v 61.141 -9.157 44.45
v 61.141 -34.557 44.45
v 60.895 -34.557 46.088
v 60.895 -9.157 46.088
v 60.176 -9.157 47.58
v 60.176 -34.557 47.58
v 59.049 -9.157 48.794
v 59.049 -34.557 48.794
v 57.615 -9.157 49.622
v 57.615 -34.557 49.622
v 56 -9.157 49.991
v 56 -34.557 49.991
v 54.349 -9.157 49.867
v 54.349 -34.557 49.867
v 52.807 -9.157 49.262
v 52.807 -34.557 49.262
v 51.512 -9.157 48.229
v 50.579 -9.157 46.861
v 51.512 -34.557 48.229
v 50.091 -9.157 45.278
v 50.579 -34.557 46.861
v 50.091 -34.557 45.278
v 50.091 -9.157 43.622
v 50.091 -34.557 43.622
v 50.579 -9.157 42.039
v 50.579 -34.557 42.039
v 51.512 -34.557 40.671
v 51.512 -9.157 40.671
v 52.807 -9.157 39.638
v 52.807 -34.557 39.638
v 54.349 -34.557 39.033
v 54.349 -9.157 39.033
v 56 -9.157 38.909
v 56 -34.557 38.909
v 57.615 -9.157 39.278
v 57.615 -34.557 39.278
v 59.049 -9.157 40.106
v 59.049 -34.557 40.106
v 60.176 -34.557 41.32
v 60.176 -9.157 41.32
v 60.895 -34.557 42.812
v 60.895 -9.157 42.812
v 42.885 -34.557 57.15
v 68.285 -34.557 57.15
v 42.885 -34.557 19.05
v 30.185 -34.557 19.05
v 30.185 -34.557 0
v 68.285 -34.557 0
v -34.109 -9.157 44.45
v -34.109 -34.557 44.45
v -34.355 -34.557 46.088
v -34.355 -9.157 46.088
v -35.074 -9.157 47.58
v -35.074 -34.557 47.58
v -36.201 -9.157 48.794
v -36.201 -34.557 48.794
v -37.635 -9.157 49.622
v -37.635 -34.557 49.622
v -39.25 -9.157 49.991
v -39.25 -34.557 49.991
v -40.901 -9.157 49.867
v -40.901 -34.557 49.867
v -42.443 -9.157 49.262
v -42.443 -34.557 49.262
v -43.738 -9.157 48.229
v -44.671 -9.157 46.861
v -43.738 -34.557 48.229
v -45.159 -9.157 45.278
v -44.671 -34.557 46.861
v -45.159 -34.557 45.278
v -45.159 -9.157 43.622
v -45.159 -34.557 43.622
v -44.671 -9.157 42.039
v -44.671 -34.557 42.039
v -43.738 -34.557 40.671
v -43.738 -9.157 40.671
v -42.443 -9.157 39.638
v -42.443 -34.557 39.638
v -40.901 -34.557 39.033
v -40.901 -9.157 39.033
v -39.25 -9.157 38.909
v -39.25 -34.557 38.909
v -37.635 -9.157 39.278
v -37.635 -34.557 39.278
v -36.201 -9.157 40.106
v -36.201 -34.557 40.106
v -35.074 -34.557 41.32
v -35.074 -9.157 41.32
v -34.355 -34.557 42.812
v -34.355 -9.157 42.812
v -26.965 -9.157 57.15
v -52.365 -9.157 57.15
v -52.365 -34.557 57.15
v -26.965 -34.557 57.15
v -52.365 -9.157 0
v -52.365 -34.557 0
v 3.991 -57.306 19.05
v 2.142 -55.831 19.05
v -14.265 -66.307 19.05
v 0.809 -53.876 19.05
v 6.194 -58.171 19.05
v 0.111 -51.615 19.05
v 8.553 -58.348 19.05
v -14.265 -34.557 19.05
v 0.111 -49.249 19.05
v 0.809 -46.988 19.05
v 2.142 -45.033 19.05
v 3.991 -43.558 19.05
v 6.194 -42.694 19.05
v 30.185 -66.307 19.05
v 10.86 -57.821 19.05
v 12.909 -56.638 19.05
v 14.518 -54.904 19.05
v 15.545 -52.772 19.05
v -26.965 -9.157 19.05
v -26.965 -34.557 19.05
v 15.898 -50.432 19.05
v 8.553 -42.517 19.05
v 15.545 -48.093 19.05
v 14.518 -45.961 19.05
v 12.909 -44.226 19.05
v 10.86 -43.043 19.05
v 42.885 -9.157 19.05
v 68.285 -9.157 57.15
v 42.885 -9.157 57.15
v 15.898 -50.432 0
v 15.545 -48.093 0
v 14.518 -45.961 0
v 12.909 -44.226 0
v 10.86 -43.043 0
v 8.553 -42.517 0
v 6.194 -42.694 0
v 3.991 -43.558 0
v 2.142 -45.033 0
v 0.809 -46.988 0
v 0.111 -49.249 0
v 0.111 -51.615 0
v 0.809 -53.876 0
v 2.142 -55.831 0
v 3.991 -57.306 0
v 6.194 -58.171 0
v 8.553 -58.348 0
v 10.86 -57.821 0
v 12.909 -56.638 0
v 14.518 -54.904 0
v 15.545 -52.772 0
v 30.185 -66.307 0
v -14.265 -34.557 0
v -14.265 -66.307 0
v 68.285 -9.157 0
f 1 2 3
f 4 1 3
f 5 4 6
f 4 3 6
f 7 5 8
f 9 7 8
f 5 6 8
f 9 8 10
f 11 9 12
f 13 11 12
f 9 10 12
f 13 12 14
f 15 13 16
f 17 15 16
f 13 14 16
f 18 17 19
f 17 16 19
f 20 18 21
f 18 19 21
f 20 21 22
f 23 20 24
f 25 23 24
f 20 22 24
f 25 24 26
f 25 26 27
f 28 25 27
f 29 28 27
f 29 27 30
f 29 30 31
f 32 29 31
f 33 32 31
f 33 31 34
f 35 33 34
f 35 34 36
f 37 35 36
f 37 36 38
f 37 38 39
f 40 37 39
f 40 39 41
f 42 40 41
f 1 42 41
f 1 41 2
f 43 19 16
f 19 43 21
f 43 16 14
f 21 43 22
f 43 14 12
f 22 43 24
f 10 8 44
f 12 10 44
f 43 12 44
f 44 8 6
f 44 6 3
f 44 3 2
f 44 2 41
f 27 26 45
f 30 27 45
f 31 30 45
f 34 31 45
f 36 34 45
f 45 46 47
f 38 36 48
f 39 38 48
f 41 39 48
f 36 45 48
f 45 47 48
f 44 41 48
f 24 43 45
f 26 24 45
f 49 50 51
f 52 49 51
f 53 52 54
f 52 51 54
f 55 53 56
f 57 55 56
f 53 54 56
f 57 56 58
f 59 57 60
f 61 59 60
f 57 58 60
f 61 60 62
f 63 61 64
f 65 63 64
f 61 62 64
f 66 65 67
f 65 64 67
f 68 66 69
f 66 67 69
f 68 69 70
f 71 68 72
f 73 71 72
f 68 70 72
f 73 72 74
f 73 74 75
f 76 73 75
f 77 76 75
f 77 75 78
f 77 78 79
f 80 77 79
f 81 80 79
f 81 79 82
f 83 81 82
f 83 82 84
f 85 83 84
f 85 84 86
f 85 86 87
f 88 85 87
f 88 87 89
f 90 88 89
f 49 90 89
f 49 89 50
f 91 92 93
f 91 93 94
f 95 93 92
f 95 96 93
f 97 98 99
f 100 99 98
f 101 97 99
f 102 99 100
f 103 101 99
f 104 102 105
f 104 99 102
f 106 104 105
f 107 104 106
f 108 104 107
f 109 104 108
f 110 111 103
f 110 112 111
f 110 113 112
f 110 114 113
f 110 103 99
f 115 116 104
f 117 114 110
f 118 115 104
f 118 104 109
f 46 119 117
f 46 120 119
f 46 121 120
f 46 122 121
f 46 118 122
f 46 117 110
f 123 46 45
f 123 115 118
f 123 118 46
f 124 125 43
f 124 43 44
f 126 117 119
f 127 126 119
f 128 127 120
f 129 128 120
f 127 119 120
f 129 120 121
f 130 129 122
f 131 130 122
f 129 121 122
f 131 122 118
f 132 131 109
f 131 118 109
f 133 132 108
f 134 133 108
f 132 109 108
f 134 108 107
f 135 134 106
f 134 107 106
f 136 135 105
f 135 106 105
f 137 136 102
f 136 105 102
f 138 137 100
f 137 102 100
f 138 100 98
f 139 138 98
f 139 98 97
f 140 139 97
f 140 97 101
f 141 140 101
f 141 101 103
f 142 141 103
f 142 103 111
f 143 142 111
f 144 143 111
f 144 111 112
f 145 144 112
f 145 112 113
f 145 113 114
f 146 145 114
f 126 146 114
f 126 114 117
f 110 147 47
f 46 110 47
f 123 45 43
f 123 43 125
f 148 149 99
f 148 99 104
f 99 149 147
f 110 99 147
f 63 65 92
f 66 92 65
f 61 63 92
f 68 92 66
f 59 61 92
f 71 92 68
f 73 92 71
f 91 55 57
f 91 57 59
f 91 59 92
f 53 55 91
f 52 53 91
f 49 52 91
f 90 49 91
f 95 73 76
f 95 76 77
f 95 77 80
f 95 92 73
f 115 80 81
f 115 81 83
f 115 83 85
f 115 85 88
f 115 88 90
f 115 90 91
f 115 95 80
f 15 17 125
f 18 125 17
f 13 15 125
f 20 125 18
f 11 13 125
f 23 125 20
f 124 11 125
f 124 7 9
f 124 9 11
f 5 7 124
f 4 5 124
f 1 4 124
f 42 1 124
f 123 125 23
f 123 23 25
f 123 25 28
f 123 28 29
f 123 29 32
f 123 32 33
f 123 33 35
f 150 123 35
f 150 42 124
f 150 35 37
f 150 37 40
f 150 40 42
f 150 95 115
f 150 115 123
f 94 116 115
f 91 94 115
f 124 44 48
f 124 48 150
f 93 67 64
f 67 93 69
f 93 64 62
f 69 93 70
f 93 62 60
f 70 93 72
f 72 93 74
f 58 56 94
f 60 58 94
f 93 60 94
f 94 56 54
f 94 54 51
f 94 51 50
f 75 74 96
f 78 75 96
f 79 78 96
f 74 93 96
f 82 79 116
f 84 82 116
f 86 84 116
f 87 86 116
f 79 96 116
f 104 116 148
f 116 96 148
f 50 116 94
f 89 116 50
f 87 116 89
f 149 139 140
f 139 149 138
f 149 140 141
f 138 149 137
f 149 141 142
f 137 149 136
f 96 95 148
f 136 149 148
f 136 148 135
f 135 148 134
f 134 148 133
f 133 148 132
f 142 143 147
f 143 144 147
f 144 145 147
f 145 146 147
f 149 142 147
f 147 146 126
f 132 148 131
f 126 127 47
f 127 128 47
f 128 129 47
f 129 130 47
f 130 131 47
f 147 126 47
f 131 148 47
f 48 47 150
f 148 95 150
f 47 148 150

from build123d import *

# Parameters (mm, degrees)
F0_W     = 44.45
F0_H     = 31.75
F1_DEPTH = 19.05
F2_R     = 7.9375
F3_DEPTH = 19.051
F4_W     = 25.4
F4_H     = 25.4
F5_DEPTH = 38.1
F6_R     = 5.55625
F7_DEPTH = 25.401
F8_R     = 5.55625
F9_DEPTH = 25.401


with BuildPart() as f1:
    # F0 (on Top) → F1 (new body)
    with BuildSketch(Plane.XY):
        Polygon((68.285176, -9.157275), (-52.364824, -9.157275), (-52.364824, -34.557275), (-14.264824, -34.557275), (30.185176, -34.557275), (68.285176, -34.557275), align=None)
        with Locations((7.960176, -50.432275)):
            Rectangle(F0_W, F0_H)
    extrude(amount=F1_DEPTH)

    # F2 (on face) → F3 (cut, through all)
    with BuildSketch(Plane.XY.offset(19.05)):
        with Locations((7.960176, -50.432275)):
            Circle(F2_R)
    extrude(amount=-F3_DEPTH, mode=Mode.SUBTRACT)

    # F4 (on face) → F5 (join)
    with BuildSketch(Plane.XY.offset(19.05)):
        with Locations((-39.664824, -21.857275)):
            Rectangle(F4_W, F4_H)
        with Locations((55.585176, -21.857275)):
            Rectangle(F4_W, F4_H)
    extrude(amount=F5_DEPTH)

    # F6 (on face) → F7 (cut, through all)
    with BuildSketch(Plane.XZ.offset(34.557275)):
        with Locations((-39.664824, 44.45)):
            Circle(F6_R)
    extrude(amount=-F7_DEPTH, mode=Mode.SUBTRACT)

    # F8 (on face) → F9 (cut, through all)
    with BuildSketch(Plane.XZ.offset(34.557275)):
        with Locations((55.585176, 44.45)):
            Circle(F8_R)
    extrude(amount=-F9_DEPTH, mode=Mode.SUBTRACT)


solid = f1.part
